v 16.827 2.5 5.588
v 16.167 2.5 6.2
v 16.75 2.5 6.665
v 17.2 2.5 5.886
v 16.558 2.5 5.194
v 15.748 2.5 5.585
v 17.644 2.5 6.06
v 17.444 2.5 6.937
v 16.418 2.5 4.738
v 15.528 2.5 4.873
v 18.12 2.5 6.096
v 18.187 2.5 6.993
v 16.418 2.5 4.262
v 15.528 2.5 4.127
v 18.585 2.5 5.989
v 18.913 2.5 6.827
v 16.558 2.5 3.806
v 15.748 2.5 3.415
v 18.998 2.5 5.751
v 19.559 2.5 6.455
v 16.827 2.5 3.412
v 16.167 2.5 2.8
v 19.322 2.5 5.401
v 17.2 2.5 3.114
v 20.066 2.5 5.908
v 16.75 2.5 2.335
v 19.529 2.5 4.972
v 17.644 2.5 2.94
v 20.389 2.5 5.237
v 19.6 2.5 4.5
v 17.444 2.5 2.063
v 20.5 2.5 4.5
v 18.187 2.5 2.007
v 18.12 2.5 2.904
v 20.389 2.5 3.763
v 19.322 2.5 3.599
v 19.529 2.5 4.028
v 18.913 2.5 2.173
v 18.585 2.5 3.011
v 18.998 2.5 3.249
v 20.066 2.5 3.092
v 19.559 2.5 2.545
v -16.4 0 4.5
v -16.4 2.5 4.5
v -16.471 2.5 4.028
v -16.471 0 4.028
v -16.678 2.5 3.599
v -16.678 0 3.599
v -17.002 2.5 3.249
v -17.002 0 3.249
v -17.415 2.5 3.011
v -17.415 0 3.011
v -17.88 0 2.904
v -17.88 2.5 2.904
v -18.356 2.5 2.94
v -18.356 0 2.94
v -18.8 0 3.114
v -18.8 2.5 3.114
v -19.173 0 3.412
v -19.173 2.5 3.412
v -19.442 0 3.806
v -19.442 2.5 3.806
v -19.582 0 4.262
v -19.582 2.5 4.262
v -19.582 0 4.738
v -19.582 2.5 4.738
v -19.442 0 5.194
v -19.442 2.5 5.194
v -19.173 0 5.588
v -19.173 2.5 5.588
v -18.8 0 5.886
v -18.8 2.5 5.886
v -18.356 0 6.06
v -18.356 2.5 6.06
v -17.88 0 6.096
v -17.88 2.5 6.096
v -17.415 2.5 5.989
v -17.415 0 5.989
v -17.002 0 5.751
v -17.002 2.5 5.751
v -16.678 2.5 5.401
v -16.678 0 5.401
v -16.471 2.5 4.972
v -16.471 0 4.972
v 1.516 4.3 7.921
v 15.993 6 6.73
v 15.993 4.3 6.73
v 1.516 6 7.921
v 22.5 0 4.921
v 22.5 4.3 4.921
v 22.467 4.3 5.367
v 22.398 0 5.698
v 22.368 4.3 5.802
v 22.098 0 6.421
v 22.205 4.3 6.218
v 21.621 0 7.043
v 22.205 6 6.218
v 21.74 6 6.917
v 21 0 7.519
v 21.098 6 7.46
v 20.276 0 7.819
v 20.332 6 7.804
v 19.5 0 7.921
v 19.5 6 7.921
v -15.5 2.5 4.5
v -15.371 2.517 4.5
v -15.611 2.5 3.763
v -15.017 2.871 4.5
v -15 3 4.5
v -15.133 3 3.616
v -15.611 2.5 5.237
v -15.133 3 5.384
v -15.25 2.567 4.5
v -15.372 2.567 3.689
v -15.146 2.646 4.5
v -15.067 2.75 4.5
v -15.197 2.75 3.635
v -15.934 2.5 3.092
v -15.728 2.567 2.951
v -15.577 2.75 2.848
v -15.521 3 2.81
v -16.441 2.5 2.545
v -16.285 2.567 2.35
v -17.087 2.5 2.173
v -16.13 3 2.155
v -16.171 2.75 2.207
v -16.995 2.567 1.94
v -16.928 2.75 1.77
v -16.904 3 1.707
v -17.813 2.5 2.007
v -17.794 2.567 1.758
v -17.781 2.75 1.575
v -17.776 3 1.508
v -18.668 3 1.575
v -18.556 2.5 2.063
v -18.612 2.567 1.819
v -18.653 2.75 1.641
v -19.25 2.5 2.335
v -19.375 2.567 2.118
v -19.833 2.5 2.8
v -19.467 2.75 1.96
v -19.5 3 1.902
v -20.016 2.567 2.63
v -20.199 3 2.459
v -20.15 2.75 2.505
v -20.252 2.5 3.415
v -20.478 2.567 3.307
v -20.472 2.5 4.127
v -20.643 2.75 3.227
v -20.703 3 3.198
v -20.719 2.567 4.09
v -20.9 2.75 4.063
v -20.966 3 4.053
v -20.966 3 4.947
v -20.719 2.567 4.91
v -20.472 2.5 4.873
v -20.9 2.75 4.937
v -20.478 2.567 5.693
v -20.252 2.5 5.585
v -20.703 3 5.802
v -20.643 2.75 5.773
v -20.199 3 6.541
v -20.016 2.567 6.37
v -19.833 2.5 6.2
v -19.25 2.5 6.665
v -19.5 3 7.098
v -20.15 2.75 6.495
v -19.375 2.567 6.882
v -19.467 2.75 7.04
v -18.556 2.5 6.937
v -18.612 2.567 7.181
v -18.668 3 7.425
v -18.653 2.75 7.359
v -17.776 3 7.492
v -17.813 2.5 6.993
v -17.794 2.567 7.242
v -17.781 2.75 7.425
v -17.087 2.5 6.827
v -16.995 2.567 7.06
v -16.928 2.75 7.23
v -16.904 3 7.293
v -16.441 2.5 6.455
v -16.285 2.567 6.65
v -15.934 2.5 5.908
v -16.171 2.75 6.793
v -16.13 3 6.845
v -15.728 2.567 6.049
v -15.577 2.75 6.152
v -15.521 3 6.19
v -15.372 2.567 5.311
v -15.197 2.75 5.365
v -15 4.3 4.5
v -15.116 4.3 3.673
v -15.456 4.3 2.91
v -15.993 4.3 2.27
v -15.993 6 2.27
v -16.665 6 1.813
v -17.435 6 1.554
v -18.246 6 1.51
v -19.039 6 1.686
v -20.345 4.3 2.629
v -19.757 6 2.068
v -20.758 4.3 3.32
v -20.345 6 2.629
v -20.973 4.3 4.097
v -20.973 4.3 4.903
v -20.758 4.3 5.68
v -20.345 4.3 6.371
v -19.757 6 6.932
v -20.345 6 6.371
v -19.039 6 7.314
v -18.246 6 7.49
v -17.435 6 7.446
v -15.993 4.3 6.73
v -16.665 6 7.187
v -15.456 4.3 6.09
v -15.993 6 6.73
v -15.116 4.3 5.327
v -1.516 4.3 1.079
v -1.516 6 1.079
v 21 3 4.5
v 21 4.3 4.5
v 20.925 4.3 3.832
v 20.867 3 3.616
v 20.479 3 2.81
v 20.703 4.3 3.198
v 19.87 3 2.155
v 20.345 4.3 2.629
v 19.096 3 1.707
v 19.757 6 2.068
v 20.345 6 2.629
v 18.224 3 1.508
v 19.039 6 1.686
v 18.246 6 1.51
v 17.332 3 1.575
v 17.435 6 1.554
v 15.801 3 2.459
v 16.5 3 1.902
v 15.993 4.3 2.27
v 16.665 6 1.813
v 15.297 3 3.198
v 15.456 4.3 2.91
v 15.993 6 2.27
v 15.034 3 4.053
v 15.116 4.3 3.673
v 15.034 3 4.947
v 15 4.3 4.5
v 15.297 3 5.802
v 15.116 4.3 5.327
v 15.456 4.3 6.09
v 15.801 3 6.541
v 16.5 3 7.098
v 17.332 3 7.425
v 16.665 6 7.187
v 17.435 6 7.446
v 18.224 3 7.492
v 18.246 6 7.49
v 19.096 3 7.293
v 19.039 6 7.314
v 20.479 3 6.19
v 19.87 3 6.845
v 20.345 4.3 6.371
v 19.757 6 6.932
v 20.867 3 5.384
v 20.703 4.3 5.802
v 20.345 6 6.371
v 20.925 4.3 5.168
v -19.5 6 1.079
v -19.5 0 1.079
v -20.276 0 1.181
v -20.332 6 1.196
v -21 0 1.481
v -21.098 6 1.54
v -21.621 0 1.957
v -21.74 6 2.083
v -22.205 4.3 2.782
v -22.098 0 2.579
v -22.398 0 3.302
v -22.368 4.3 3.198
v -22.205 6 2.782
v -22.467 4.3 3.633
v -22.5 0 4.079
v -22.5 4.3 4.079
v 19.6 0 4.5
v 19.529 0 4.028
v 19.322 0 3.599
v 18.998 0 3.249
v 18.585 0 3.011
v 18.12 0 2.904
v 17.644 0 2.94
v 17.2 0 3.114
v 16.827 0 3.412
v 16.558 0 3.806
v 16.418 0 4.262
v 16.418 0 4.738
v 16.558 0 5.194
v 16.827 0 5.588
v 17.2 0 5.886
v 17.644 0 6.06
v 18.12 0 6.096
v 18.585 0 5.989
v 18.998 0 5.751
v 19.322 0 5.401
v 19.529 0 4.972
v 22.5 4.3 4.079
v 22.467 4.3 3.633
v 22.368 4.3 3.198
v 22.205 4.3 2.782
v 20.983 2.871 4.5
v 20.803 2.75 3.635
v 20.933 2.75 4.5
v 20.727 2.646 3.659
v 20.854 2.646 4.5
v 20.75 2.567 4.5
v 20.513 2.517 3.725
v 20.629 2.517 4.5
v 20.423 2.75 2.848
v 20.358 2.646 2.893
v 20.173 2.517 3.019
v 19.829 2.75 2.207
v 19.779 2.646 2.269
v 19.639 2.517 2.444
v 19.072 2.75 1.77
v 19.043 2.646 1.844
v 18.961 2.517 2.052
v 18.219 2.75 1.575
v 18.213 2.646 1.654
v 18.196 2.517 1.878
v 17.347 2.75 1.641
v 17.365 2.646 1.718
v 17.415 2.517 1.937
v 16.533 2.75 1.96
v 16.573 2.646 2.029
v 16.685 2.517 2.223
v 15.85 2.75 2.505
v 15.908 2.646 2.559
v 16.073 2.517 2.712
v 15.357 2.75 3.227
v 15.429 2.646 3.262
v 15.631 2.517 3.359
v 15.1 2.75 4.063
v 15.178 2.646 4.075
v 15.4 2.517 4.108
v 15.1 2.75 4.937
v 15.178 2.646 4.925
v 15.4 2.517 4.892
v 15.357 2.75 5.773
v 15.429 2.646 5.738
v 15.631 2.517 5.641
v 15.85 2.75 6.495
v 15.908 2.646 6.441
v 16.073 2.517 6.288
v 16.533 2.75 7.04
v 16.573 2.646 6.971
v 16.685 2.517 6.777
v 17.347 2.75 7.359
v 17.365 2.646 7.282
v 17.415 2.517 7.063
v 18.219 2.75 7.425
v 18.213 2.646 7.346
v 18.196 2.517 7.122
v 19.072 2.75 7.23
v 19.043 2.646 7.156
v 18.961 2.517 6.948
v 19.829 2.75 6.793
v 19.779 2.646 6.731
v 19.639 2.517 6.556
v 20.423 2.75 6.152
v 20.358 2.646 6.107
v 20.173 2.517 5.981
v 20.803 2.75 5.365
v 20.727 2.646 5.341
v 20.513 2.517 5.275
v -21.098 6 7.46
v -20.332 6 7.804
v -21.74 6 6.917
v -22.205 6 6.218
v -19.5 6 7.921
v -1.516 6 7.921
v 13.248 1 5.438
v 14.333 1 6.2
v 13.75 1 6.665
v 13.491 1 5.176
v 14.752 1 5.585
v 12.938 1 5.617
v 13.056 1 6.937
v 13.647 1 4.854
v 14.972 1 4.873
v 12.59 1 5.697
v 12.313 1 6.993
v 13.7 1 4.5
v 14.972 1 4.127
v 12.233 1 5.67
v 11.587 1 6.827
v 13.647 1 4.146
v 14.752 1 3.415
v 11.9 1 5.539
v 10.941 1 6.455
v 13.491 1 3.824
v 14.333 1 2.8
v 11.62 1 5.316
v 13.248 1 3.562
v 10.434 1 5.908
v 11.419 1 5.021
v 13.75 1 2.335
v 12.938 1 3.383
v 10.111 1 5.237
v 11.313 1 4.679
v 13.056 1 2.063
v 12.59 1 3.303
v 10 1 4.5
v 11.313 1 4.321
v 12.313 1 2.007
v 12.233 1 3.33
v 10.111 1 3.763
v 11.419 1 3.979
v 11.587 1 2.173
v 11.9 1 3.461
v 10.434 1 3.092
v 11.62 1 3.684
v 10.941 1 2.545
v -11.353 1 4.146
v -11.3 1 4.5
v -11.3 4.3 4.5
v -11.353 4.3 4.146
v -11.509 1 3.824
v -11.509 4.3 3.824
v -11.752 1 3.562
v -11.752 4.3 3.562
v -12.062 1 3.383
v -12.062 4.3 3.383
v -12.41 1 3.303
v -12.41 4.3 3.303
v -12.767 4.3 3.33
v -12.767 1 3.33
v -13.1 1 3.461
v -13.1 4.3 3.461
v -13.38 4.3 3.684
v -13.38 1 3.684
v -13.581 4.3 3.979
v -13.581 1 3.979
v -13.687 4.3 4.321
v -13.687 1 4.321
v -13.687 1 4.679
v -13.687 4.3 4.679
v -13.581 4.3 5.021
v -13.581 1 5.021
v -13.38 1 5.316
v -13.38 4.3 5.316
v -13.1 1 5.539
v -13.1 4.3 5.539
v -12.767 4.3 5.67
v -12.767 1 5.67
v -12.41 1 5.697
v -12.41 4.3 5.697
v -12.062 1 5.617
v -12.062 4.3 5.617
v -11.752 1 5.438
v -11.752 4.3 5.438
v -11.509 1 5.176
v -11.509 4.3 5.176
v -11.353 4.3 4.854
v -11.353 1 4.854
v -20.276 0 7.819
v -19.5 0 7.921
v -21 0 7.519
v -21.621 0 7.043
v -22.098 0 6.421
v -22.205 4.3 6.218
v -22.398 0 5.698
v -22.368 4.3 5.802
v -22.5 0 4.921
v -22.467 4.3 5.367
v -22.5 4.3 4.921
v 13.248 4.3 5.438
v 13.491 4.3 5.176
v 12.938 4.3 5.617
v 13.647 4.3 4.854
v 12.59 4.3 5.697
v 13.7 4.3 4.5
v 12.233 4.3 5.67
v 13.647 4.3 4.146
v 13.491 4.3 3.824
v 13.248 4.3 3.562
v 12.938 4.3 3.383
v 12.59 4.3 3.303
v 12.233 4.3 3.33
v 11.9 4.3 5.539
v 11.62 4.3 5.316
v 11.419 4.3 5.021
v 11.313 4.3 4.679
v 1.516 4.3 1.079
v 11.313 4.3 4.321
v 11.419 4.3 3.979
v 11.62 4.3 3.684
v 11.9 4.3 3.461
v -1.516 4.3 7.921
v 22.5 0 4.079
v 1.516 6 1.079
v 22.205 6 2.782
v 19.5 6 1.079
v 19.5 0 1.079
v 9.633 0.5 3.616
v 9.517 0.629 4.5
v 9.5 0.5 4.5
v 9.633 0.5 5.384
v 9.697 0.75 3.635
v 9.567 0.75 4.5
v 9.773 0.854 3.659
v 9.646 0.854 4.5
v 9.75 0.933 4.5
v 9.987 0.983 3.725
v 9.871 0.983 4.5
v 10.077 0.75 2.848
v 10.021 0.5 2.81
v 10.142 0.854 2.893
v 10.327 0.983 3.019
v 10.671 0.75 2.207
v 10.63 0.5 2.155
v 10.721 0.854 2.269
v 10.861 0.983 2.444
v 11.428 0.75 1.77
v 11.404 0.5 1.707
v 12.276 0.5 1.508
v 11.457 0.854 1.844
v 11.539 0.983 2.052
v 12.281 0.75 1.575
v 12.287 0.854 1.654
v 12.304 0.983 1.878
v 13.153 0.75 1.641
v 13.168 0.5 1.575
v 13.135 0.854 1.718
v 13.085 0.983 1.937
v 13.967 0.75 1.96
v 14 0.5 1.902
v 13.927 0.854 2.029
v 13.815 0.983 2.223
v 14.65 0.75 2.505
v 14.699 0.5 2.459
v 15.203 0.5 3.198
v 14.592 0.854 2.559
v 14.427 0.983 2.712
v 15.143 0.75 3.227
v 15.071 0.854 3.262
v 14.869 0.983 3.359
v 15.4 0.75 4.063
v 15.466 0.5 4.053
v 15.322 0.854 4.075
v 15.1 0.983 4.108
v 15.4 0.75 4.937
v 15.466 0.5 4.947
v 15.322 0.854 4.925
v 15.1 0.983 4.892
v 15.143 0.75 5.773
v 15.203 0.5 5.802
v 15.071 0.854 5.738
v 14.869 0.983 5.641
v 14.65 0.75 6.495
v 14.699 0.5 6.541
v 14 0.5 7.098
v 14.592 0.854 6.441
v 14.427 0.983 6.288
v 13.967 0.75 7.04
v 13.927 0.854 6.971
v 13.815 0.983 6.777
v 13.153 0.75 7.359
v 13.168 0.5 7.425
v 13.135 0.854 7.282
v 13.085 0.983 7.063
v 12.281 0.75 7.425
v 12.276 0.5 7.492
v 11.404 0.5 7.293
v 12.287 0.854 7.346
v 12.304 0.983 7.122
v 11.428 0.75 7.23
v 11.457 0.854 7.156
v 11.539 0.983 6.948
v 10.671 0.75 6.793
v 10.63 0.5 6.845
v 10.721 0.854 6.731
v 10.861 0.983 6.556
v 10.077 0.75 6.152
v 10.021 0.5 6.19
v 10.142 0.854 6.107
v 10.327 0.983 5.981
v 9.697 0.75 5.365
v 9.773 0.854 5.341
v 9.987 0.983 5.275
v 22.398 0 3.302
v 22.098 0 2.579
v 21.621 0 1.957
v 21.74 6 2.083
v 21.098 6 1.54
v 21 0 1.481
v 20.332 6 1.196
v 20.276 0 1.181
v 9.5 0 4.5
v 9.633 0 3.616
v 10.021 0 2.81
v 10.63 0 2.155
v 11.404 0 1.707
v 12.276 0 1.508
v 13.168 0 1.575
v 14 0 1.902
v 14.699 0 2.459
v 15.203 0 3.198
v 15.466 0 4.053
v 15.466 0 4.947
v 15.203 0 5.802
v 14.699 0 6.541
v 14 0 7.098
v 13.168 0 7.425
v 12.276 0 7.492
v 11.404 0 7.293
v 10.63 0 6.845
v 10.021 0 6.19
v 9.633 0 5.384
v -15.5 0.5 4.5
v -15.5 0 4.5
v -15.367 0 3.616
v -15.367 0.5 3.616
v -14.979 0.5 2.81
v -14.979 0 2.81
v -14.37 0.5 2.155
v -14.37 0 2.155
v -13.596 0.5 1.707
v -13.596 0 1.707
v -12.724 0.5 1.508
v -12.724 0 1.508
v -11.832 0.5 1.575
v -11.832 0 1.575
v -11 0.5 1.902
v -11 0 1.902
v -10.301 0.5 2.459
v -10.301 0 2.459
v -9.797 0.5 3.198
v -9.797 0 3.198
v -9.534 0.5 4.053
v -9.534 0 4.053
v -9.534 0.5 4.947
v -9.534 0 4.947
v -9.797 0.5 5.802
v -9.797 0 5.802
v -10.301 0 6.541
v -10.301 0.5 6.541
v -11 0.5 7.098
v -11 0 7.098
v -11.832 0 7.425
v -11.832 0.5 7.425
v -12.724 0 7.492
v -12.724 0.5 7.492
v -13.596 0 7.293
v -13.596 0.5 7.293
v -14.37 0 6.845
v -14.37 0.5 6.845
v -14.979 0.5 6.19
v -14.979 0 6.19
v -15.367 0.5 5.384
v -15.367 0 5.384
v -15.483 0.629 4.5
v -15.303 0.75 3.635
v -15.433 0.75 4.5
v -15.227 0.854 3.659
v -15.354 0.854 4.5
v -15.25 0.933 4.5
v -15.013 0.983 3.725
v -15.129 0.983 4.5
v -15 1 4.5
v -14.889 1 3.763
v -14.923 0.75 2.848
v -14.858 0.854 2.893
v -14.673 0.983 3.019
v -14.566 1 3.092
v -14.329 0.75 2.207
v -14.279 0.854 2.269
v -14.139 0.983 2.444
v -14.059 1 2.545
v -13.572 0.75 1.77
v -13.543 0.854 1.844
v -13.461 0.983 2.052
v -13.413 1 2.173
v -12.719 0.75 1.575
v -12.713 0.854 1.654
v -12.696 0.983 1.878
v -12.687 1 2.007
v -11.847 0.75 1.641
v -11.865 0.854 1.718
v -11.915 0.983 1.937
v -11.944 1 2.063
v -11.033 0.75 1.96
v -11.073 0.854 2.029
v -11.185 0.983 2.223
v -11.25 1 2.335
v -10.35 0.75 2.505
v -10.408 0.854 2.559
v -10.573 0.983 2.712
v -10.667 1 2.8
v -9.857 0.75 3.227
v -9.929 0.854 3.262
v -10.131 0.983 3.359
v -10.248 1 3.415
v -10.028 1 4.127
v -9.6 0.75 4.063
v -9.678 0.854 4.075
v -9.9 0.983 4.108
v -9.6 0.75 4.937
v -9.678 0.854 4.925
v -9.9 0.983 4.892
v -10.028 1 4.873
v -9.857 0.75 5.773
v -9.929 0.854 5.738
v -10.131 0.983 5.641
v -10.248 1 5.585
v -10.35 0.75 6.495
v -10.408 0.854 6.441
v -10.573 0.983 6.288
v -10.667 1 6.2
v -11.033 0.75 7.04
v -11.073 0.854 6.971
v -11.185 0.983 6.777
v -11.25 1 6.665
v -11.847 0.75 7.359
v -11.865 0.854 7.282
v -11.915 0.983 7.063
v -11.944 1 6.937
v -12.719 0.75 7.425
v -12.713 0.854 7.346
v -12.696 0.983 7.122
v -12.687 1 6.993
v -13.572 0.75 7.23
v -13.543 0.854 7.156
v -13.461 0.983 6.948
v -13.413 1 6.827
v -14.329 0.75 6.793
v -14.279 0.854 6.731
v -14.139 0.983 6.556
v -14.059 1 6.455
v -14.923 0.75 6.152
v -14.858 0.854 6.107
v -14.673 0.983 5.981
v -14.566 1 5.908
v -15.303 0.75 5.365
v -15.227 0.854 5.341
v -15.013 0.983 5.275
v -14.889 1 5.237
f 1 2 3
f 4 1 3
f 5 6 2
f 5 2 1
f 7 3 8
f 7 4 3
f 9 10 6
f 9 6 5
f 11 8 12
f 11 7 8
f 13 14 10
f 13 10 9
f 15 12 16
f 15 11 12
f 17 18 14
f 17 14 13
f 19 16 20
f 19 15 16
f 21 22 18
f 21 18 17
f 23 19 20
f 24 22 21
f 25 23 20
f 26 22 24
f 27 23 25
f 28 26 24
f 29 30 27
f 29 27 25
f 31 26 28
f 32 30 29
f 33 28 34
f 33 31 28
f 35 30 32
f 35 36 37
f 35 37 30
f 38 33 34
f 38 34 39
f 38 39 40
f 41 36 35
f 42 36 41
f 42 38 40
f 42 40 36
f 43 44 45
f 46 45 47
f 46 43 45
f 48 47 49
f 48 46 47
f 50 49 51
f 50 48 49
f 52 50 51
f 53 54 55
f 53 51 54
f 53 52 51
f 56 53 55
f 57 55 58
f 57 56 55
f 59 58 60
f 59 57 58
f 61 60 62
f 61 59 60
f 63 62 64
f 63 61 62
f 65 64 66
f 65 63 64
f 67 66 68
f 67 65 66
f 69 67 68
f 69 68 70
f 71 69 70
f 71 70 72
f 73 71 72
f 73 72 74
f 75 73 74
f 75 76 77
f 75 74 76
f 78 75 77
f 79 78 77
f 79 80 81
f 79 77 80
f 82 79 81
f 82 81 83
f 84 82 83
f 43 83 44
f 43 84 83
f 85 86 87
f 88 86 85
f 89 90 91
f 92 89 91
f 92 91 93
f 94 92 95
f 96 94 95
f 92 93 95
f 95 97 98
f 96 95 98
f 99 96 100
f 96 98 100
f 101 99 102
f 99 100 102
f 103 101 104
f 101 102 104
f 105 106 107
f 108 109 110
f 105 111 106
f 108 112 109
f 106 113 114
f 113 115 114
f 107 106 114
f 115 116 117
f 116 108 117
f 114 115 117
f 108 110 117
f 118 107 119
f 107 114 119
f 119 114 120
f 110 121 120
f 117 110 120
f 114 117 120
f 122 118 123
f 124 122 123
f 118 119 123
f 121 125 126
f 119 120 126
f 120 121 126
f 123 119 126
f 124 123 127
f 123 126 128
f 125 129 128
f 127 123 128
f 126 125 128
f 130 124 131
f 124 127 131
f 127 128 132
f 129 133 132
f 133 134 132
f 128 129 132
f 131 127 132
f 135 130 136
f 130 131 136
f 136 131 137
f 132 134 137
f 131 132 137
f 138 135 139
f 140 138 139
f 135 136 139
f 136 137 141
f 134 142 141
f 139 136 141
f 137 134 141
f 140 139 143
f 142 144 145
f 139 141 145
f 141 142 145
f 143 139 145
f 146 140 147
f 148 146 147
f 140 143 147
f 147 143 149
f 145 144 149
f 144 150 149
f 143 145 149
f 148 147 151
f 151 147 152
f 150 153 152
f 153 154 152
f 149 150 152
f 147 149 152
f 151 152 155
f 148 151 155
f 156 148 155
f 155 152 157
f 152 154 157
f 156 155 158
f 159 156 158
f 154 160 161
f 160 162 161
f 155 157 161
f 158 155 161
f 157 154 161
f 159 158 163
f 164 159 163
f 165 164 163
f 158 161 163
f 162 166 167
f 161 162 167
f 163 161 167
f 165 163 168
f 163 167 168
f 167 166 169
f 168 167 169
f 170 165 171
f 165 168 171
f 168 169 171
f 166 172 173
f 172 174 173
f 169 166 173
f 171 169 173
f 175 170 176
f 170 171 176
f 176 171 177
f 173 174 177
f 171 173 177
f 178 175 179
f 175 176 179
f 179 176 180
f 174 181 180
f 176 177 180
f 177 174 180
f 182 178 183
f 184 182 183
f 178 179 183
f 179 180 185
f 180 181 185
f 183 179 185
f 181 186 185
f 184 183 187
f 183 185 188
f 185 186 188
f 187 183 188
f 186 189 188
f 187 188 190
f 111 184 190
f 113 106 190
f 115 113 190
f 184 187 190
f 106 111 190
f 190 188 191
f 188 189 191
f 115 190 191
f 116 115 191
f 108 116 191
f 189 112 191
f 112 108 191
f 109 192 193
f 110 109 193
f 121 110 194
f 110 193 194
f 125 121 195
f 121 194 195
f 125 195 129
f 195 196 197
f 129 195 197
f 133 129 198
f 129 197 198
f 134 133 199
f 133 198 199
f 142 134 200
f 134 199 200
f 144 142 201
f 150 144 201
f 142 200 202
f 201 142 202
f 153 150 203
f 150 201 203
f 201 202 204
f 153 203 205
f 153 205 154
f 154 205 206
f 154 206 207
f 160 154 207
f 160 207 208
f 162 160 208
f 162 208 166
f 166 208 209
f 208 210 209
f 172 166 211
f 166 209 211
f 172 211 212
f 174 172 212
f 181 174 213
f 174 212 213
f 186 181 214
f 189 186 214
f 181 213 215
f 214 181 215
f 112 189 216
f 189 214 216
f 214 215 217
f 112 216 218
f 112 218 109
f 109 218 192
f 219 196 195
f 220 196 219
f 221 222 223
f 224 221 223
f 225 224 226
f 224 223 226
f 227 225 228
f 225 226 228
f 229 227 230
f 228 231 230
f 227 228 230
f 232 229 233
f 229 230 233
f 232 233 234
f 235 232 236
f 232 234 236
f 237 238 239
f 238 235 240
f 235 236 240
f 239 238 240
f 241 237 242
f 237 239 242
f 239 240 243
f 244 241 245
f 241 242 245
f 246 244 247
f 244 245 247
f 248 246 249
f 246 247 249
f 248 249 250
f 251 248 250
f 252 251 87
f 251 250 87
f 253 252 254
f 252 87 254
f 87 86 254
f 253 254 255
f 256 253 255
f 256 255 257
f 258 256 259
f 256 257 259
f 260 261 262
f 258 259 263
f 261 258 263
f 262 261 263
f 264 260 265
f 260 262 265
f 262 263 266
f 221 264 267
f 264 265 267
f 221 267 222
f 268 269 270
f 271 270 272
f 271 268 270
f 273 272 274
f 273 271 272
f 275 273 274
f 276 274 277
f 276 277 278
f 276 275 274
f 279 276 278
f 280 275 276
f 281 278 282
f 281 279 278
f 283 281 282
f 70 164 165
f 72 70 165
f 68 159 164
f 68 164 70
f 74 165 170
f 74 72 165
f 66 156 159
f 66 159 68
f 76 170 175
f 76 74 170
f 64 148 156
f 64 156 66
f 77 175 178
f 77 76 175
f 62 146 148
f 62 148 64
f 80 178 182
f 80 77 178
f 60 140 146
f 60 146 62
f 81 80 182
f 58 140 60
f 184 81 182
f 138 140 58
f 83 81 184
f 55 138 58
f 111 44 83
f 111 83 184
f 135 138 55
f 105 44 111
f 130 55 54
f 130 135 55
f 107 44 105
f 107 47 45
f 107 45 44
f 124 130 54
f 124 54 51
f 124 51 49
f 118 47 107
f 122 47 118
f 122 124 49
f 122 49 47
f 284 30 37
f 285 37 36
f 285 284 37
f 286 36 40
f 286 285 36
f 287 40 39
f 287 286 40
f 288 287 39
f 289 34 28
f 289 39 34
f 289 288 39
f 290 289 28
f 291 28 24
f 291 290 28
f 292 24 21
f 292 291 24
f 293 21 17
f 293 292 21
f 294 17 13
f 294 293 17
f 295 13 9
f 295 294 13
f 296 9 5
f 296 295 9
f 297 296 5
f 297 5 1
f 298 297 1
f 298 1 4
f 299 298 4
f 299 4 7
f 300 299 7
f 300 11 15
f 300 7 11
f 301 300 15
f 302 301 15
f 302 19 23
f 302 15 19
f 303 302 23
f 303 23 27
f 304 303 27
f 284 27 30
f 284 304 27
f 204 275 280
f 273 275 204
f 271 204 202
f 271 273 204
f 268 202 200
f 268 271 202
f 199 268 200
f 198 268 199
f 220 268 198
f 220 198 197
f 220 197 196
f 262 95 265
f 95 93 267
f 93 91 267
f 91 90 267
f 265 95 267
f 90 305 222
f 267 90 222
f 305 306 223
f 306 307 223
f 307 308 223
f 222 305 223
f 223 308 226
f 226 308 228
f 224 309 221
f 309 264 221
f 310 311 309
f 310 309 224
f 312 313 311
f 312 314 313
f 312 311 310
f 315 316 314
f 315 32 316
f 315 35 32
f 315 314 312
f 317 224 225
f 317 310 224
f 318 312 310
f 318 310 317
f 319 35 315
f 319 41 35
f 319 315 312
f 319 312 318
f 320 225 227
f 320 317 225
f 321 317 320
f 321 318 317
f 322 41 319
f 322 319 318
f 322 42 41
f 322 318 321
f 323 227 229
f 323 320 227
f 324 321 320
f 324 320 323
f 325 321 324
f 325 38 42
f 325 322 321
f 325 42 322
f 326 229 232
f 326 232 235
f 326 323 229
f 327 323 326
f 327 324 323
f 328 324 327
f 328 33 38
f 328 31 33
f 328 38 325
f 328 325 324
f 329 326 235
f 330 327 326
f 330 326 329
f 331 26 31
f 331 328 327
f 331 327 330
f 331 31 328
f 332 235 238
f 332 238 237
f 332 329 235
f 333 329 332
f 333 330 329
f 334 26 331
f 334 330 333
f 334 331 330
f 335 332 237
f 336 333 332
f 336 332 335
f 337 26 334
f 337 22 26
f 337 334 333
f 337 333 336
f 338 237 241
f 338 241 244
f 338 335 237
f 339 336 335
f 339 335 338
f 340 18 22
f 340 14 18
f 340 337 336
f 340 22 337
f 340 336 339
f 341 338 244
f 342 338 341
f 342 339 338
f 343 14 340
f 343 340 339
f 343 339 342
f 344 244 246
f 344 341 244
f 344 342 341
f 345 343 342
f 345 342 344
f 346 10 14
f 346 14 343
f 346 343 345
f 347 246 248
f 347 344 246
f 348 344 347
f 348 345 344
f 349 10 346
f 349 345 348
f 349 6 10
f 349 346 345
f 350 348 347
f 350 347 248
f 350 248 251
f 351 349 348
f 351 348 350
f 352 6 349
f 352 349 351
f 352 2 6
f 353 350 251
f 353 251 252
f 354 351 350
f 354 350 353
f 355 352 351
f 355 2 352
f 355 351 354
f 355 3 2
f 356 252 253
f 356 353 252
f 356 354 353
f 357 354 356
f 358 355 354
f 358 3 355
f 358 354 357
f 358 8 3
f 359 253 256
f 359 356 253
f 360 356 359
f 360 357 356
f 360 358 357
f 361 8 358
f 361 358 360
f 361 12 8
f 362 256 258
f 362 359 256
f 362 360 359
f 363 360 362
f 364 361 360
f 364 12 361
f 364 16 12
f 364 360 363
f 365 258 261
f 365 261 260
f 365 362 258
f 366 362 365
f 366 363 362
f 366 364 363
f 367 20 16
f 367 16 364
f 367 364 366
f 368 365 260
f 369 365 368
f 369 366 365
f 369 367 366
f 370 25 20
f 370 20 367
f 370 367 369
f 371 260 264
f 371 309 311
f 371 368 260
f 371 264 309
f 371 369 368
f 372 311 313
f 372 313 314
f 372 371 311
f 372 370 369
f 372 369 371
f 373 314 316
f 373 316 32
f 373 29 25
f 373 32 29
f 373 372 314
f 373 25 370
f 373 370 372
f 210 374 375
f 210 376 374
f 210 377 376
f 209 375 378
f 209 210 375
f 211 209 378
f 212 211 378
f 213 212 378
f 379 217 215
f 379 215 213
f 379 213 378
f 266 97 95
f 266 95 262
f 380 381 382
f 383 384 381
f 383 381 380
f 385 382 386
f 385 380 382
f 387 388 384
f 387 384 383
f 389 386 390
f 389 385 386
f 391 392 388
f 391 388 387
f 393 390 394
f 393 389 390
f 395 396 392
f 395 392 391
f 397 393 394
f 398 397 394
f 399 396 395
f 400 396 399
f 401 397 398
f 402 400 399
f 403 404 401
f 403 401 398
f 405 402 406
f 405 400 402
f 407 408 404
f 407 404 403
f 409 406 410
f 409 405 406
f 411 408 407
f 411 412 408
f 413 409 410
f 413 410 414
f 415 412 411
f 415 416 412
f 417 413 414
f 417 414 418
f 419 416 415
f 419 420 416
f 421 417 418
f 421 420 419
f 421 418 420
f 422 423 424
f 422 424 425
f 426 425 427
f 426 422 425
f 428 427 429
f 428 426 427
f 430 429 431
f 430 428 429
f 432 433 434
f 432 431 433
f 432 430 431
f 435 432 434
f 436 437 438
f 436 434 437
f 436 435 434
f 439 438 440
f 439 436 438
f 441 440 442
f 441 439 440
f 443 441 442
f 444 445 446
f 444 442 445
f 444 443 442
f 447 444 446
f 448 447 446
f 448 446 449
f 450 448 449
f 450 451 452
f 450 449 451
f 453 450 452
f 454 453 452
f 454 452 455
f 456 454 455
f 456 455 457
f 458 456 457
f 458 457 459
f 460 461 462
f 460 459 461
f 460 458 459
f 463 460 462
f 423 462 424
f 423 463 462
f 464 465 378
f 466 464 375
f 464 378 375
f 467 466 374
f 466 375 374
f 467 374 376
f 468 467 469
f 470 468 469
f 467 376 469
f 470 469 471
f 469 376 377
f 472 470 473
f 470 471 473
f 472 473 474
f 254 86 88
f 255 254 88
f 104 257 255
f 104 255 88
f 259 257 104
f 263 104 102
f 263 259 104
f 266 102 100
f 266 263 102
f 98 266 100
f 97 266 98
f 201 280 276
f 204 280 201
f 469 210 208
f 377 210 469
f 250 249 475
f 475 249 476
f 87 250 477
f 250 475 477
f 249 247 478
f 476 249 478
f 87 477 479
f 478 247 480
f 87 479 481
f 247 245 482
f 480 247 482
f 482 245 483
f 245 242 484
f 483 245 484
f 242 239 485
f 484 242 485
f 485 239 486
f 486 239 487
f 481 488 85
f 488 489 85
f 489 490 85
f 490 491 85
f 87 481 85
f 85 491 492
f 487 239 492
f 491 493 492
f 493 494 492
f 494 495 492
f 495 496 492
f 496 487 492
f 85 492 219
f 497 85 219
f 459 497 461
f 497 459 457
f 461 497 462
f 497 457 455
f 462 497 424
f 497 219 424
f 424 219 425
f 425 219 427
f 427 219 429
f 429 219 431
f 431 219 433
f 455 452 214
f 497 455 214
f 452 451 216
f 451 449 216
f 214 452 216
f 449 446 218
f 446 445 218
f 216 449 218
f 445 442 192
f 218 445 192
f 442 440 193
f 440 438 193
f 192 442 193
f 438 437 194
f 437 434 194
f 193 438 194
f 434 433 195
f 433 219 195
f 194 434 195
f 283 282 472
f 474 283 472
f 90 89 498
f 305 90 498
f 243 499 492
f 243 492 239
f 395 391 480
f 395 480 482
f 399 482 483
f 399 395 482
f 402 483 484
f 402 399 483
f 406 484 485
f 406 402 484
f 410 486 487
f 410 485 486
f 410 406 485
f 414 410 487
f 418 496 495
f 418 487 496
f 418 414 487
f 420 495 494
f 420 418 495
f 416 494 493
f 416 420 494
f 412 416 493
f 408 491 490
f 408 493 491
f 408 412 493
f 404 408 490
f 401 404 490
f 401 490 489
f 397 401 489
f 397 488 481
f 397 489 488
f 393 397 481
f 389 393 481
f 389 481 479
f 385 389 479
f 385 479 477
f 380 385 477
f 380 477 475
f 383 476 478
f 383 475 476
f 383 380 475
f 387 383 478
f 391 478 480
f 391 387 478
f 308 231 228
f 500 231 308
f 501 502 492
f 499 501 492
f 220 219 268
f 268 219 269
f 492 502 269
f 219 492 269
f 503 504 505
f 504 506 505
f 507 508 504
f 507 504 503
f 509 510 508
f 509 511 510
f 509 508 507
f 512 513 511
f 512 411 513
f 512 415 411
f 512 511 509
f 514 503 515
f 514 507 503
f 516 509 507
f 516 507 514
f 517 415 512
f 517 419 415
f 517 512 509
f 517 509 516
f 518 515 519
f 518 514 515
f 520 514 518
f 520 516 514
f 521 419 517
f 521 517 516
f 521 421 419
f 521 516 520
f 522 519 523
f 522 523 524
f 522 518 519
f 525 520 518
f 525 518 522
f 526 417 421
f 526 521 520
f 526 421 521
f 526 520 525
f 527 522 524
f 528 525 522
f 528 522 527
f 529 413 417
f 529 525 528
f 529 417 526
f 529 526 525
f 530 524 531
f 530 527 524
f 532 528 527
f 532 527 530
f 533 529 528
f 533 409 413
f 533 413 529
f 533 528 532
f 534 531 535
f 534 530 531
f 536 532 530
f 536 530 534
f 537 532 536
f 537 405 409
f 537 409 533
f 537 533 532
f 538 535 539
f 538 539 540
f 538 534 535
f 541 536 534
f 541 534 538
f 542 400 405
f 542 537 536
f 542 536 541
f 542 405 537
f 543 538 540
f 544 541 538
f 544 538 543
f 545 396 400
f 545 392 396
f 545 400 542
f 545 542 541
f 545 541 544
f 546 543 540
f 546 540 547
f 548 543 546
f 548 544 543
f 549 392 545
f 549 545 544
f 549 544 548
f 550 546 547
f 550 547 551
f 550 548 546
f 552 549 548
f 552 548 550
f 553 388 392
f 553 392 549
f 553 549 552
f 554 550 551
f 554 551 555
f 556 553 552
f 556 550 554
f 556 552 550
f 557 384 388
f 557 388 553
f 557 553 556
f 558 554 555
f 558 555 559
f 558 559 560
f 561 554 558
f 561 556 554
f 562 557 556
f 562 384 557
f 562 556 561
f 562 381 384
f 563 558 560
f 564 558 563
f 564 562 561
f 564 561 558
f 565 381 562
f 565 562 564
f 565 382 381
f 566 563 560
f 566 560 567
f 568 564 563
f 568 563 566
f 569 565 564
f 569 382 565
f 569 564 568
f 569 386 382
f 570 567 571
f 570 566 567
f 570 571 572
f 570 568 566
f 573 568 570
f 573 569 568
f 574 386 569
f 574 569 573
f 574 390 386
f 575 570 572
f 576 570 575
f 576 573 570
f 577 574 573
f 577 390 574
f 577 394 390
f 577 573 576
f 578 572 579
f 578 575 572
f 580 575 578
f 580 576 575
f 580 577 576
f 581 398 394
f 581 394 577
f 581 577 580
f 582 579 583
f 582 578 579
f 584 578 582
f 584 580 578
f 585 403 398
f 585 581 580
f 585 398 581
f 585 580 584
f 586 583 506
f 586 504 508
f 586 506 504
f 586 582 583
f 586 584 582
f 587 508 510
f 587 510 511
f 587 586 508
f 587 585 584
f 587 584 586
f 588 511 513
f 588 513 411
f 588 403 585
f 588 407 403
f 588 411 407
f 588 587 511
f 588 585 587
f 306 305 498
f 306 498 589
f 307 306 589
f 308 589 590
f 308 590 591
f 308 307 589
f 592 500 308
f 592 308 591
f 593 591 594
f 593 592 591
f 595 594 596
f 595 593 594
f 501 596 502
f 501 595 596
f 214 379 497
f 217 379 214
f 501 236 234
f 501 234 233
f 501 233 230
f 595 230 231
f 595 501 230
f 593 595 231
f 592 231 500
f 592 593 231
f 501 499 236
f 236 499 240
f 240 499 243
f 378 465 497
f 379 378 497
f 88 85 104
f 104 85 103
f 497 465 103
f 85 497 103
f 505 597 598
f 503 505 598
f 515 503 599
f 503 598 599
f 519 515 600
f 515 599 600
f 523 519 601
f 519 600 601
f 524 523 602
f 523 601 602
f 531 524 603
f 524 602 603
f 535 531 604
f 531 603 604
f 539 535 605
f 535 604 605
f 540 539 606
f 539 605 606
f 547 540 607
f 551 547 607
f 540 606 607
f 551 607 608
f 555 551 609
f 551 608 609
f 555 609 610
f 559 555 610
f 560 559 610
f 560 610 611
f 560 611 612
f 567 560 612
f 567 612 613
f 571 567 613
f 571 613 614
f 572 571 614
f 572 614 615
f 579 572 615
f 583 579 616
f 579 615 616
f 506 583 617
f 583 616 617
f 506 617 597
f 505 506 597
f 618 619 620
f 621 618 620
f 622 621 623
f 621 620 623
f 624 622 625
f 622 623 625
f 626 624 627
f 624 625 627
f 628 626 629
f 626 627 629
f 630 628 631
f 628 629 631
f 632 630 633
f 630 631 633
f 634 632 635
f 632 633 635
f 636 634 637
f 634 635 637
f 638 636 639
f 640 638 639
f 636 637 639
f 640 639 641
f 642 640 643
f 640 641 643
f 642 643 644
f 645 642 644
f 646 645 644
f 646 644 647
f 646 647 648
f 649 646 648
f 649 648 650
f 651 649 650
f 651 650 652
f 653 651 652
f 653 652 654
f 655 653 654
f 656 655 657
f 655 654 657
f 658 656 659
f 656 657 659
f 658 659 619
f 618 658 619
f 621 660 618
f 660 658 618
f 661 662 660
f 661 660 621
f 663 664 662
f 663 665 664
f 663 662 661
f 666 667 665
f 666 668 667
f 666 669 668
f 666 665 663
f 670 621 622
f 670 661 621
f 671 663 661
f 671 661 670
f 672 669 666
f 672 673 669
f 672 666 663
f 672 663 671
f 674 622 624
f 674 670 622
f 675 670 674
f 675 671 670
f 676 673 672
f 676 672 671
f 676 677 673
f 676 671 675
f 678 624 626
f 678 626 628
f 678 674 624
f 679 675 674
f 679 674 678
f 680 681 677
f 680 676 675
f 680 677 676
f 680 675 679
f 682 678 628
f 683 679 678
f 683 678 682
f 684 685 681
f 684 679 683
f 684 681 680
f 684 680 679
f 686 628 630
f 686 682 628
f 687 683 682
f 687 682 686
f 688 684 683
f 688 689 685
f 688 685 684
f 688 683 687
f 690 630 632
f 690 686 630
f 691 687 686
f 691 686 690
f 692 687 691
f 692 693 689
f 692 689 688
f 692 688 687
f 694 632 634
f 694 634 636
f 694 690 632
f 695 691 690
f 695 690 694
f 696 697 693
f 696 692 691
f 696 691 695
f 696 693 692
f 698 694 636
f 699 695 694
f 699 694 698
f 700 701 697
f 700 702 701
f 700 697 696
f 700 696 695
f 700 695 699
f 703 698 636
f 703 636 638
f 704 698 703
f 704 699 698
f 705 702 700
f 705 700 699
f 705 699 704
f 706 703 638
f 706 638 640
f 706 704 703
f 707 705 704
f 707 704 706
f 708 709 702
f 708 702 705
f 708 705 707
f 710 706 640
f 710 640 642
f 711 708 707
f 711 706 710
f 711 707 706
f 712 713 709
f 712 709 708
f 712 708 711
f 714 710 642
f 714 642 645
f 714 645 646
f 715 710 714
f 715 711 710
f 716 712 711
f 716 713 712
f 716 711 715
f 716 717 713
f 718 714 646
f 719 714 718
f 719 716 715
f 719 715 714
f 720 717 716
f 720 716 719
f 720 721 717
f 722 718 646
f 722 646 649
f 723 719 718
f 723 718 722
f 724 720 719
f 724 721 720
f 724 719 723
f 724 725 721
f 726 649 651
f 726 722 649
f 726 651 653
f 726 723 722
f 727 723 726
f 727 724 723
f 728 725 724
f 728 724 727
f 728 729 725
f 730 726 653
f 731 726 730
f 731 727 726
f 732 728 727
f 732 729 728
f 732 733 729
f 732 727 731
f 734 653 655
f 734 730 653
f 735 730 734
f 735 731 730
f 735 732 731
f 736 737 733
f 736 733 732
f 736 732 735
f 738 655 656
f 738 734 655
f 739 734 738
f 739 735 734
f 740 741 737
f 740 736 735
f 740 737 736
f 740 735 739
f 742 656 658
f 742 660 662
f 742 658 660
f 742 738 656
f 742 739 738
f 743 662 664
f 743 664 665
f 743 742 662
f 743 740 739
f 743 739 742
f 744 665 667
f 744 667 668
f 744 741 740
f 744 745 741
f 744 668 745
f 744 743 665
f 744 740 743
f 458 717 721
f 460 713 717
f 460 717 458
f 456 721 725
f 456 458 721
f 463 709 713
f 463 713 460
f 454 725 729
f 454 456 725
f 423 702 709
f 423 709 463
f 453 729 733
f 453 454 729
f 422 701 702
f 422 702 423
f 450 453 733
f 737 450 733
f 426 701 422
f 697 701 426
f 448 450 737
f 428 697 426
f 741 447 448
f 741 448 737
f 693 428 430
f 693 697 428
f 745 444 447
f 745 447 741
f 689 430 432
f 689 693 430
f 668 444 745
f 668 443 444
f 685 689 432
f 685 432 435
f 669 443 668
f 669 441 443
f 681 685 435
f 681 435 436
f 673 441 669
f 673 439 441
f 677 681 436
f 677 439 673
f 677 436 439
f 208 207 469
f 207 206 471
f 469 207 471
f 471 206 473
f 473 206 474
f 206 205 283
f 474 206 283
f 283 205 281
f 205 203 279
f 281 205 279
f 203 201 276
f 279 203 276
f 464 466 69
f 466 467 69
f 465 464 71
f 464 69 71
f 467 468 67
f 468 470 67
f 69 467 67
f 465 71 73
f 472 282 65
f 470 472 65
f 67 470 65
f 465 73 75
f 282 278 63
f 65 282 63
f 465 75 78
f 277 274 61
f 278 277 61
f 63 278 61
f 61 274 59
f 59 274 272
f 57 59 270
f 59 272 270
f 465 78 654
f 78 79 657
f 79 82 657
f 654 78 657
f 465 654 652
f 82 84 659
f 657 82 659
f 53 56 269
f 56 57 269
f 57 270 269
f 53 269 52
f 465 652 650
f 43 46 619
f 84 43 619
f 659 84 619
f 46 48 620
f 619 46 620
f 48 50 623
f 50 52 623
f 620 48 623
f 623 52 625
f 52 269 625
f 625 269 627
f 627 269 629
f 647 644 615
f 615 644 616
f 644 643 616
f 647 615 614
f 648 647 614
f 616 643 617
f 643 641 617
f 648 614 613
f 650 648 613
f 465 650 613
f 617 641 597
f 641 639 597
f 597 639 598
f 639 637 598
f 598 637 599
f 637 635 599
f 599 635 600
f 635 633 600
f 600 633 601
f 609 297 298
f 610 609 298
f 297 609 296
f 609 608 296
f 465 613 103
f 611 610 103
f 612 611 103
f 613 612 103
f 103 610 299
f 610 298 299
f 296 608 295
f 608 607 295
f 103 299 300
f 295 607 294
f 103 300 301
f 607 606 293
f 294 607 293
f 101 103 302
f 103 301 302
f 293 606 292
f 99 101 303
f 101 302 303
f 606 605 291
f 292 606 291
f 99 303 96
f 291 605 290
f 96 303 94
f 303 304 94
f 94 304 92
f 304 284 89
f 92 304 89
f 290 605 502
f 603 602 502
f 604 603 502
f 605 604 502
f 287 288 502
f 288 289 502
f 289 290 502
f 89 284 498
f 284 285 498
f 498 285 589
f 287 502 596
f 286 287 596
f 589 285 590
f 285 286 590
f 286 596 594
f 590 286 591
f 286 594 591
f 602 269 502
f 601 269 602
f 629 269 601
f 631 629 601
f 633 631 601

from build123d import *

# Parameters (mm, degrees)
SKETCH_2_R               = 1.2
SKETCH_2_R_2             = 1.6
EXTRUDE_2_DEPTH          = 6
SKETCH_3_R               = 3
CUT_EXTRUDE_1_DEPTH      = 1
FILLET_2_R               = 3
CUT_EXTRUDE_2_DEPTH      = 1.7
SKETCH_5_R               = 3
CUT_EXTRUDE_3_DEPTH      = 2.7
CUT_EXTRUDE_3_DEPTH_BACK = 1.8
FILLET_3_R               = 0.5


with BuildPart() as part:
    # 草图2 → 凸台-拉伸2 (new body)
    with BuildSketch(Plane(origin=(0, 0, 4.5), x_dir=(1, 0, 0), z_dir=(0, 1, 0))):
        Polygon((22.5, -3.42139756), (22.5, 3.421397553), (3.906515802, 3.421397553), (-3.906515802, 3.421397553), (-22.5, 3.421397553), (-22.5, -3.42139756), (-3.906515802, -3.42139756), (3.906515802, -3.42139756), align=None)
        with Locations((-12.5, -3e-09)):
            Circle(SKETCH_2_R, mode=Mode.SUBTRACT)
        with Locations((12.5, -3e-09)):
            Circle(SKETCH_2_R, mode=Mode.SUBTRACT)
        with Locations((-18, -3e-09)):
            Circle(SKETCH_2_R_2, mode=Mode.SUBTRACT)
        with Locations((18, -3e-09)):
            Circle(SKETCH_2_R_2, mode=Mode.SUBTRACT)
    extrude(amount=EXTRUDE_2_DEPTH)

    # 草图3 → 切除-拉伸1 (cut)
    with BuildSketch(Plane(origin=(0, 0, 0), x_dir=(-1, 0, 0), z_dir=(0, -1, 0))):
        with Locations((-12.5, -4.500000003)):
            Circle(SKETCH_3_R)
        with Locations((12.5, -4.500000003)):
            Circle(SKETCH_3_R)
    extrude(amount=-CUT_EXTRUDE_1_DEPTH, mode=Mode.SUBTRACT)

    # 圆角2
    fillet_2_edges = [part.edges().sort_by_distance(p)[0] for p in [
        (22.5, 3, 1.078602447),
        (22.5, 3, 7.92139756),
        (-22.5, 3, 7.92139756),
        (-22.5, 3, 1.078602447),
    ]]
    fillet(fillet_2_edges, radius=FILLET_2_R)

    # 草图4 → 切除-拉伸2 (cut)
    with BuildSketch(Plane(origin=(0, 6, 0), x_dir=(1, 0, 0), z_dir=(0, 1, 0))):
        Polygon((43.079074711, -4.500000003), (0, -8.046158962), (-43.079074711, -4.500000003), (0, -0.953841045), align=None)
    extrude(amount=-CUT_EXTRUDE_2_DEPTH, mode=Mode.SUBTRACT)

    # 草图5 → 切除-拉伸3 (cut, two sides)
    with BuildSketch(Plane(origin=(0, 4.3, 0), x_dir=(1, 0, 0), z_dir=(0, 1, 0))) as cut_extrude_3_sk:
        with Locations((-18, -4.500000003)):
            Circle(SKETCH_5_R)
        with Locations((18, -4.500000003)):
            Circle(SKETCH_5_R)
    extrude(amount=CUT_EXTRUDE_3_DEPTH, mode=Mode.SUBTRACT)
    extrude(cut_extrude_3_sk.sketch, amount=-CUT_EXTRUDE_3_DEPTH_BACK, mode=Mode.SUBTRACT)

    # 圆角3
    fillet_3_edges = [part.edges().sort_by_distance(p)[0] for p in [
        (-21, 2.5, 4.500000003),
        (15, 2.5, 4.500000003),
        (15.5, 1, 4.500000003),
        (-9.5, 1, 4.500000003),
    ]]
    fillet(fillet_3_edges, radius=FILLET_3_R)


solid = part.part
